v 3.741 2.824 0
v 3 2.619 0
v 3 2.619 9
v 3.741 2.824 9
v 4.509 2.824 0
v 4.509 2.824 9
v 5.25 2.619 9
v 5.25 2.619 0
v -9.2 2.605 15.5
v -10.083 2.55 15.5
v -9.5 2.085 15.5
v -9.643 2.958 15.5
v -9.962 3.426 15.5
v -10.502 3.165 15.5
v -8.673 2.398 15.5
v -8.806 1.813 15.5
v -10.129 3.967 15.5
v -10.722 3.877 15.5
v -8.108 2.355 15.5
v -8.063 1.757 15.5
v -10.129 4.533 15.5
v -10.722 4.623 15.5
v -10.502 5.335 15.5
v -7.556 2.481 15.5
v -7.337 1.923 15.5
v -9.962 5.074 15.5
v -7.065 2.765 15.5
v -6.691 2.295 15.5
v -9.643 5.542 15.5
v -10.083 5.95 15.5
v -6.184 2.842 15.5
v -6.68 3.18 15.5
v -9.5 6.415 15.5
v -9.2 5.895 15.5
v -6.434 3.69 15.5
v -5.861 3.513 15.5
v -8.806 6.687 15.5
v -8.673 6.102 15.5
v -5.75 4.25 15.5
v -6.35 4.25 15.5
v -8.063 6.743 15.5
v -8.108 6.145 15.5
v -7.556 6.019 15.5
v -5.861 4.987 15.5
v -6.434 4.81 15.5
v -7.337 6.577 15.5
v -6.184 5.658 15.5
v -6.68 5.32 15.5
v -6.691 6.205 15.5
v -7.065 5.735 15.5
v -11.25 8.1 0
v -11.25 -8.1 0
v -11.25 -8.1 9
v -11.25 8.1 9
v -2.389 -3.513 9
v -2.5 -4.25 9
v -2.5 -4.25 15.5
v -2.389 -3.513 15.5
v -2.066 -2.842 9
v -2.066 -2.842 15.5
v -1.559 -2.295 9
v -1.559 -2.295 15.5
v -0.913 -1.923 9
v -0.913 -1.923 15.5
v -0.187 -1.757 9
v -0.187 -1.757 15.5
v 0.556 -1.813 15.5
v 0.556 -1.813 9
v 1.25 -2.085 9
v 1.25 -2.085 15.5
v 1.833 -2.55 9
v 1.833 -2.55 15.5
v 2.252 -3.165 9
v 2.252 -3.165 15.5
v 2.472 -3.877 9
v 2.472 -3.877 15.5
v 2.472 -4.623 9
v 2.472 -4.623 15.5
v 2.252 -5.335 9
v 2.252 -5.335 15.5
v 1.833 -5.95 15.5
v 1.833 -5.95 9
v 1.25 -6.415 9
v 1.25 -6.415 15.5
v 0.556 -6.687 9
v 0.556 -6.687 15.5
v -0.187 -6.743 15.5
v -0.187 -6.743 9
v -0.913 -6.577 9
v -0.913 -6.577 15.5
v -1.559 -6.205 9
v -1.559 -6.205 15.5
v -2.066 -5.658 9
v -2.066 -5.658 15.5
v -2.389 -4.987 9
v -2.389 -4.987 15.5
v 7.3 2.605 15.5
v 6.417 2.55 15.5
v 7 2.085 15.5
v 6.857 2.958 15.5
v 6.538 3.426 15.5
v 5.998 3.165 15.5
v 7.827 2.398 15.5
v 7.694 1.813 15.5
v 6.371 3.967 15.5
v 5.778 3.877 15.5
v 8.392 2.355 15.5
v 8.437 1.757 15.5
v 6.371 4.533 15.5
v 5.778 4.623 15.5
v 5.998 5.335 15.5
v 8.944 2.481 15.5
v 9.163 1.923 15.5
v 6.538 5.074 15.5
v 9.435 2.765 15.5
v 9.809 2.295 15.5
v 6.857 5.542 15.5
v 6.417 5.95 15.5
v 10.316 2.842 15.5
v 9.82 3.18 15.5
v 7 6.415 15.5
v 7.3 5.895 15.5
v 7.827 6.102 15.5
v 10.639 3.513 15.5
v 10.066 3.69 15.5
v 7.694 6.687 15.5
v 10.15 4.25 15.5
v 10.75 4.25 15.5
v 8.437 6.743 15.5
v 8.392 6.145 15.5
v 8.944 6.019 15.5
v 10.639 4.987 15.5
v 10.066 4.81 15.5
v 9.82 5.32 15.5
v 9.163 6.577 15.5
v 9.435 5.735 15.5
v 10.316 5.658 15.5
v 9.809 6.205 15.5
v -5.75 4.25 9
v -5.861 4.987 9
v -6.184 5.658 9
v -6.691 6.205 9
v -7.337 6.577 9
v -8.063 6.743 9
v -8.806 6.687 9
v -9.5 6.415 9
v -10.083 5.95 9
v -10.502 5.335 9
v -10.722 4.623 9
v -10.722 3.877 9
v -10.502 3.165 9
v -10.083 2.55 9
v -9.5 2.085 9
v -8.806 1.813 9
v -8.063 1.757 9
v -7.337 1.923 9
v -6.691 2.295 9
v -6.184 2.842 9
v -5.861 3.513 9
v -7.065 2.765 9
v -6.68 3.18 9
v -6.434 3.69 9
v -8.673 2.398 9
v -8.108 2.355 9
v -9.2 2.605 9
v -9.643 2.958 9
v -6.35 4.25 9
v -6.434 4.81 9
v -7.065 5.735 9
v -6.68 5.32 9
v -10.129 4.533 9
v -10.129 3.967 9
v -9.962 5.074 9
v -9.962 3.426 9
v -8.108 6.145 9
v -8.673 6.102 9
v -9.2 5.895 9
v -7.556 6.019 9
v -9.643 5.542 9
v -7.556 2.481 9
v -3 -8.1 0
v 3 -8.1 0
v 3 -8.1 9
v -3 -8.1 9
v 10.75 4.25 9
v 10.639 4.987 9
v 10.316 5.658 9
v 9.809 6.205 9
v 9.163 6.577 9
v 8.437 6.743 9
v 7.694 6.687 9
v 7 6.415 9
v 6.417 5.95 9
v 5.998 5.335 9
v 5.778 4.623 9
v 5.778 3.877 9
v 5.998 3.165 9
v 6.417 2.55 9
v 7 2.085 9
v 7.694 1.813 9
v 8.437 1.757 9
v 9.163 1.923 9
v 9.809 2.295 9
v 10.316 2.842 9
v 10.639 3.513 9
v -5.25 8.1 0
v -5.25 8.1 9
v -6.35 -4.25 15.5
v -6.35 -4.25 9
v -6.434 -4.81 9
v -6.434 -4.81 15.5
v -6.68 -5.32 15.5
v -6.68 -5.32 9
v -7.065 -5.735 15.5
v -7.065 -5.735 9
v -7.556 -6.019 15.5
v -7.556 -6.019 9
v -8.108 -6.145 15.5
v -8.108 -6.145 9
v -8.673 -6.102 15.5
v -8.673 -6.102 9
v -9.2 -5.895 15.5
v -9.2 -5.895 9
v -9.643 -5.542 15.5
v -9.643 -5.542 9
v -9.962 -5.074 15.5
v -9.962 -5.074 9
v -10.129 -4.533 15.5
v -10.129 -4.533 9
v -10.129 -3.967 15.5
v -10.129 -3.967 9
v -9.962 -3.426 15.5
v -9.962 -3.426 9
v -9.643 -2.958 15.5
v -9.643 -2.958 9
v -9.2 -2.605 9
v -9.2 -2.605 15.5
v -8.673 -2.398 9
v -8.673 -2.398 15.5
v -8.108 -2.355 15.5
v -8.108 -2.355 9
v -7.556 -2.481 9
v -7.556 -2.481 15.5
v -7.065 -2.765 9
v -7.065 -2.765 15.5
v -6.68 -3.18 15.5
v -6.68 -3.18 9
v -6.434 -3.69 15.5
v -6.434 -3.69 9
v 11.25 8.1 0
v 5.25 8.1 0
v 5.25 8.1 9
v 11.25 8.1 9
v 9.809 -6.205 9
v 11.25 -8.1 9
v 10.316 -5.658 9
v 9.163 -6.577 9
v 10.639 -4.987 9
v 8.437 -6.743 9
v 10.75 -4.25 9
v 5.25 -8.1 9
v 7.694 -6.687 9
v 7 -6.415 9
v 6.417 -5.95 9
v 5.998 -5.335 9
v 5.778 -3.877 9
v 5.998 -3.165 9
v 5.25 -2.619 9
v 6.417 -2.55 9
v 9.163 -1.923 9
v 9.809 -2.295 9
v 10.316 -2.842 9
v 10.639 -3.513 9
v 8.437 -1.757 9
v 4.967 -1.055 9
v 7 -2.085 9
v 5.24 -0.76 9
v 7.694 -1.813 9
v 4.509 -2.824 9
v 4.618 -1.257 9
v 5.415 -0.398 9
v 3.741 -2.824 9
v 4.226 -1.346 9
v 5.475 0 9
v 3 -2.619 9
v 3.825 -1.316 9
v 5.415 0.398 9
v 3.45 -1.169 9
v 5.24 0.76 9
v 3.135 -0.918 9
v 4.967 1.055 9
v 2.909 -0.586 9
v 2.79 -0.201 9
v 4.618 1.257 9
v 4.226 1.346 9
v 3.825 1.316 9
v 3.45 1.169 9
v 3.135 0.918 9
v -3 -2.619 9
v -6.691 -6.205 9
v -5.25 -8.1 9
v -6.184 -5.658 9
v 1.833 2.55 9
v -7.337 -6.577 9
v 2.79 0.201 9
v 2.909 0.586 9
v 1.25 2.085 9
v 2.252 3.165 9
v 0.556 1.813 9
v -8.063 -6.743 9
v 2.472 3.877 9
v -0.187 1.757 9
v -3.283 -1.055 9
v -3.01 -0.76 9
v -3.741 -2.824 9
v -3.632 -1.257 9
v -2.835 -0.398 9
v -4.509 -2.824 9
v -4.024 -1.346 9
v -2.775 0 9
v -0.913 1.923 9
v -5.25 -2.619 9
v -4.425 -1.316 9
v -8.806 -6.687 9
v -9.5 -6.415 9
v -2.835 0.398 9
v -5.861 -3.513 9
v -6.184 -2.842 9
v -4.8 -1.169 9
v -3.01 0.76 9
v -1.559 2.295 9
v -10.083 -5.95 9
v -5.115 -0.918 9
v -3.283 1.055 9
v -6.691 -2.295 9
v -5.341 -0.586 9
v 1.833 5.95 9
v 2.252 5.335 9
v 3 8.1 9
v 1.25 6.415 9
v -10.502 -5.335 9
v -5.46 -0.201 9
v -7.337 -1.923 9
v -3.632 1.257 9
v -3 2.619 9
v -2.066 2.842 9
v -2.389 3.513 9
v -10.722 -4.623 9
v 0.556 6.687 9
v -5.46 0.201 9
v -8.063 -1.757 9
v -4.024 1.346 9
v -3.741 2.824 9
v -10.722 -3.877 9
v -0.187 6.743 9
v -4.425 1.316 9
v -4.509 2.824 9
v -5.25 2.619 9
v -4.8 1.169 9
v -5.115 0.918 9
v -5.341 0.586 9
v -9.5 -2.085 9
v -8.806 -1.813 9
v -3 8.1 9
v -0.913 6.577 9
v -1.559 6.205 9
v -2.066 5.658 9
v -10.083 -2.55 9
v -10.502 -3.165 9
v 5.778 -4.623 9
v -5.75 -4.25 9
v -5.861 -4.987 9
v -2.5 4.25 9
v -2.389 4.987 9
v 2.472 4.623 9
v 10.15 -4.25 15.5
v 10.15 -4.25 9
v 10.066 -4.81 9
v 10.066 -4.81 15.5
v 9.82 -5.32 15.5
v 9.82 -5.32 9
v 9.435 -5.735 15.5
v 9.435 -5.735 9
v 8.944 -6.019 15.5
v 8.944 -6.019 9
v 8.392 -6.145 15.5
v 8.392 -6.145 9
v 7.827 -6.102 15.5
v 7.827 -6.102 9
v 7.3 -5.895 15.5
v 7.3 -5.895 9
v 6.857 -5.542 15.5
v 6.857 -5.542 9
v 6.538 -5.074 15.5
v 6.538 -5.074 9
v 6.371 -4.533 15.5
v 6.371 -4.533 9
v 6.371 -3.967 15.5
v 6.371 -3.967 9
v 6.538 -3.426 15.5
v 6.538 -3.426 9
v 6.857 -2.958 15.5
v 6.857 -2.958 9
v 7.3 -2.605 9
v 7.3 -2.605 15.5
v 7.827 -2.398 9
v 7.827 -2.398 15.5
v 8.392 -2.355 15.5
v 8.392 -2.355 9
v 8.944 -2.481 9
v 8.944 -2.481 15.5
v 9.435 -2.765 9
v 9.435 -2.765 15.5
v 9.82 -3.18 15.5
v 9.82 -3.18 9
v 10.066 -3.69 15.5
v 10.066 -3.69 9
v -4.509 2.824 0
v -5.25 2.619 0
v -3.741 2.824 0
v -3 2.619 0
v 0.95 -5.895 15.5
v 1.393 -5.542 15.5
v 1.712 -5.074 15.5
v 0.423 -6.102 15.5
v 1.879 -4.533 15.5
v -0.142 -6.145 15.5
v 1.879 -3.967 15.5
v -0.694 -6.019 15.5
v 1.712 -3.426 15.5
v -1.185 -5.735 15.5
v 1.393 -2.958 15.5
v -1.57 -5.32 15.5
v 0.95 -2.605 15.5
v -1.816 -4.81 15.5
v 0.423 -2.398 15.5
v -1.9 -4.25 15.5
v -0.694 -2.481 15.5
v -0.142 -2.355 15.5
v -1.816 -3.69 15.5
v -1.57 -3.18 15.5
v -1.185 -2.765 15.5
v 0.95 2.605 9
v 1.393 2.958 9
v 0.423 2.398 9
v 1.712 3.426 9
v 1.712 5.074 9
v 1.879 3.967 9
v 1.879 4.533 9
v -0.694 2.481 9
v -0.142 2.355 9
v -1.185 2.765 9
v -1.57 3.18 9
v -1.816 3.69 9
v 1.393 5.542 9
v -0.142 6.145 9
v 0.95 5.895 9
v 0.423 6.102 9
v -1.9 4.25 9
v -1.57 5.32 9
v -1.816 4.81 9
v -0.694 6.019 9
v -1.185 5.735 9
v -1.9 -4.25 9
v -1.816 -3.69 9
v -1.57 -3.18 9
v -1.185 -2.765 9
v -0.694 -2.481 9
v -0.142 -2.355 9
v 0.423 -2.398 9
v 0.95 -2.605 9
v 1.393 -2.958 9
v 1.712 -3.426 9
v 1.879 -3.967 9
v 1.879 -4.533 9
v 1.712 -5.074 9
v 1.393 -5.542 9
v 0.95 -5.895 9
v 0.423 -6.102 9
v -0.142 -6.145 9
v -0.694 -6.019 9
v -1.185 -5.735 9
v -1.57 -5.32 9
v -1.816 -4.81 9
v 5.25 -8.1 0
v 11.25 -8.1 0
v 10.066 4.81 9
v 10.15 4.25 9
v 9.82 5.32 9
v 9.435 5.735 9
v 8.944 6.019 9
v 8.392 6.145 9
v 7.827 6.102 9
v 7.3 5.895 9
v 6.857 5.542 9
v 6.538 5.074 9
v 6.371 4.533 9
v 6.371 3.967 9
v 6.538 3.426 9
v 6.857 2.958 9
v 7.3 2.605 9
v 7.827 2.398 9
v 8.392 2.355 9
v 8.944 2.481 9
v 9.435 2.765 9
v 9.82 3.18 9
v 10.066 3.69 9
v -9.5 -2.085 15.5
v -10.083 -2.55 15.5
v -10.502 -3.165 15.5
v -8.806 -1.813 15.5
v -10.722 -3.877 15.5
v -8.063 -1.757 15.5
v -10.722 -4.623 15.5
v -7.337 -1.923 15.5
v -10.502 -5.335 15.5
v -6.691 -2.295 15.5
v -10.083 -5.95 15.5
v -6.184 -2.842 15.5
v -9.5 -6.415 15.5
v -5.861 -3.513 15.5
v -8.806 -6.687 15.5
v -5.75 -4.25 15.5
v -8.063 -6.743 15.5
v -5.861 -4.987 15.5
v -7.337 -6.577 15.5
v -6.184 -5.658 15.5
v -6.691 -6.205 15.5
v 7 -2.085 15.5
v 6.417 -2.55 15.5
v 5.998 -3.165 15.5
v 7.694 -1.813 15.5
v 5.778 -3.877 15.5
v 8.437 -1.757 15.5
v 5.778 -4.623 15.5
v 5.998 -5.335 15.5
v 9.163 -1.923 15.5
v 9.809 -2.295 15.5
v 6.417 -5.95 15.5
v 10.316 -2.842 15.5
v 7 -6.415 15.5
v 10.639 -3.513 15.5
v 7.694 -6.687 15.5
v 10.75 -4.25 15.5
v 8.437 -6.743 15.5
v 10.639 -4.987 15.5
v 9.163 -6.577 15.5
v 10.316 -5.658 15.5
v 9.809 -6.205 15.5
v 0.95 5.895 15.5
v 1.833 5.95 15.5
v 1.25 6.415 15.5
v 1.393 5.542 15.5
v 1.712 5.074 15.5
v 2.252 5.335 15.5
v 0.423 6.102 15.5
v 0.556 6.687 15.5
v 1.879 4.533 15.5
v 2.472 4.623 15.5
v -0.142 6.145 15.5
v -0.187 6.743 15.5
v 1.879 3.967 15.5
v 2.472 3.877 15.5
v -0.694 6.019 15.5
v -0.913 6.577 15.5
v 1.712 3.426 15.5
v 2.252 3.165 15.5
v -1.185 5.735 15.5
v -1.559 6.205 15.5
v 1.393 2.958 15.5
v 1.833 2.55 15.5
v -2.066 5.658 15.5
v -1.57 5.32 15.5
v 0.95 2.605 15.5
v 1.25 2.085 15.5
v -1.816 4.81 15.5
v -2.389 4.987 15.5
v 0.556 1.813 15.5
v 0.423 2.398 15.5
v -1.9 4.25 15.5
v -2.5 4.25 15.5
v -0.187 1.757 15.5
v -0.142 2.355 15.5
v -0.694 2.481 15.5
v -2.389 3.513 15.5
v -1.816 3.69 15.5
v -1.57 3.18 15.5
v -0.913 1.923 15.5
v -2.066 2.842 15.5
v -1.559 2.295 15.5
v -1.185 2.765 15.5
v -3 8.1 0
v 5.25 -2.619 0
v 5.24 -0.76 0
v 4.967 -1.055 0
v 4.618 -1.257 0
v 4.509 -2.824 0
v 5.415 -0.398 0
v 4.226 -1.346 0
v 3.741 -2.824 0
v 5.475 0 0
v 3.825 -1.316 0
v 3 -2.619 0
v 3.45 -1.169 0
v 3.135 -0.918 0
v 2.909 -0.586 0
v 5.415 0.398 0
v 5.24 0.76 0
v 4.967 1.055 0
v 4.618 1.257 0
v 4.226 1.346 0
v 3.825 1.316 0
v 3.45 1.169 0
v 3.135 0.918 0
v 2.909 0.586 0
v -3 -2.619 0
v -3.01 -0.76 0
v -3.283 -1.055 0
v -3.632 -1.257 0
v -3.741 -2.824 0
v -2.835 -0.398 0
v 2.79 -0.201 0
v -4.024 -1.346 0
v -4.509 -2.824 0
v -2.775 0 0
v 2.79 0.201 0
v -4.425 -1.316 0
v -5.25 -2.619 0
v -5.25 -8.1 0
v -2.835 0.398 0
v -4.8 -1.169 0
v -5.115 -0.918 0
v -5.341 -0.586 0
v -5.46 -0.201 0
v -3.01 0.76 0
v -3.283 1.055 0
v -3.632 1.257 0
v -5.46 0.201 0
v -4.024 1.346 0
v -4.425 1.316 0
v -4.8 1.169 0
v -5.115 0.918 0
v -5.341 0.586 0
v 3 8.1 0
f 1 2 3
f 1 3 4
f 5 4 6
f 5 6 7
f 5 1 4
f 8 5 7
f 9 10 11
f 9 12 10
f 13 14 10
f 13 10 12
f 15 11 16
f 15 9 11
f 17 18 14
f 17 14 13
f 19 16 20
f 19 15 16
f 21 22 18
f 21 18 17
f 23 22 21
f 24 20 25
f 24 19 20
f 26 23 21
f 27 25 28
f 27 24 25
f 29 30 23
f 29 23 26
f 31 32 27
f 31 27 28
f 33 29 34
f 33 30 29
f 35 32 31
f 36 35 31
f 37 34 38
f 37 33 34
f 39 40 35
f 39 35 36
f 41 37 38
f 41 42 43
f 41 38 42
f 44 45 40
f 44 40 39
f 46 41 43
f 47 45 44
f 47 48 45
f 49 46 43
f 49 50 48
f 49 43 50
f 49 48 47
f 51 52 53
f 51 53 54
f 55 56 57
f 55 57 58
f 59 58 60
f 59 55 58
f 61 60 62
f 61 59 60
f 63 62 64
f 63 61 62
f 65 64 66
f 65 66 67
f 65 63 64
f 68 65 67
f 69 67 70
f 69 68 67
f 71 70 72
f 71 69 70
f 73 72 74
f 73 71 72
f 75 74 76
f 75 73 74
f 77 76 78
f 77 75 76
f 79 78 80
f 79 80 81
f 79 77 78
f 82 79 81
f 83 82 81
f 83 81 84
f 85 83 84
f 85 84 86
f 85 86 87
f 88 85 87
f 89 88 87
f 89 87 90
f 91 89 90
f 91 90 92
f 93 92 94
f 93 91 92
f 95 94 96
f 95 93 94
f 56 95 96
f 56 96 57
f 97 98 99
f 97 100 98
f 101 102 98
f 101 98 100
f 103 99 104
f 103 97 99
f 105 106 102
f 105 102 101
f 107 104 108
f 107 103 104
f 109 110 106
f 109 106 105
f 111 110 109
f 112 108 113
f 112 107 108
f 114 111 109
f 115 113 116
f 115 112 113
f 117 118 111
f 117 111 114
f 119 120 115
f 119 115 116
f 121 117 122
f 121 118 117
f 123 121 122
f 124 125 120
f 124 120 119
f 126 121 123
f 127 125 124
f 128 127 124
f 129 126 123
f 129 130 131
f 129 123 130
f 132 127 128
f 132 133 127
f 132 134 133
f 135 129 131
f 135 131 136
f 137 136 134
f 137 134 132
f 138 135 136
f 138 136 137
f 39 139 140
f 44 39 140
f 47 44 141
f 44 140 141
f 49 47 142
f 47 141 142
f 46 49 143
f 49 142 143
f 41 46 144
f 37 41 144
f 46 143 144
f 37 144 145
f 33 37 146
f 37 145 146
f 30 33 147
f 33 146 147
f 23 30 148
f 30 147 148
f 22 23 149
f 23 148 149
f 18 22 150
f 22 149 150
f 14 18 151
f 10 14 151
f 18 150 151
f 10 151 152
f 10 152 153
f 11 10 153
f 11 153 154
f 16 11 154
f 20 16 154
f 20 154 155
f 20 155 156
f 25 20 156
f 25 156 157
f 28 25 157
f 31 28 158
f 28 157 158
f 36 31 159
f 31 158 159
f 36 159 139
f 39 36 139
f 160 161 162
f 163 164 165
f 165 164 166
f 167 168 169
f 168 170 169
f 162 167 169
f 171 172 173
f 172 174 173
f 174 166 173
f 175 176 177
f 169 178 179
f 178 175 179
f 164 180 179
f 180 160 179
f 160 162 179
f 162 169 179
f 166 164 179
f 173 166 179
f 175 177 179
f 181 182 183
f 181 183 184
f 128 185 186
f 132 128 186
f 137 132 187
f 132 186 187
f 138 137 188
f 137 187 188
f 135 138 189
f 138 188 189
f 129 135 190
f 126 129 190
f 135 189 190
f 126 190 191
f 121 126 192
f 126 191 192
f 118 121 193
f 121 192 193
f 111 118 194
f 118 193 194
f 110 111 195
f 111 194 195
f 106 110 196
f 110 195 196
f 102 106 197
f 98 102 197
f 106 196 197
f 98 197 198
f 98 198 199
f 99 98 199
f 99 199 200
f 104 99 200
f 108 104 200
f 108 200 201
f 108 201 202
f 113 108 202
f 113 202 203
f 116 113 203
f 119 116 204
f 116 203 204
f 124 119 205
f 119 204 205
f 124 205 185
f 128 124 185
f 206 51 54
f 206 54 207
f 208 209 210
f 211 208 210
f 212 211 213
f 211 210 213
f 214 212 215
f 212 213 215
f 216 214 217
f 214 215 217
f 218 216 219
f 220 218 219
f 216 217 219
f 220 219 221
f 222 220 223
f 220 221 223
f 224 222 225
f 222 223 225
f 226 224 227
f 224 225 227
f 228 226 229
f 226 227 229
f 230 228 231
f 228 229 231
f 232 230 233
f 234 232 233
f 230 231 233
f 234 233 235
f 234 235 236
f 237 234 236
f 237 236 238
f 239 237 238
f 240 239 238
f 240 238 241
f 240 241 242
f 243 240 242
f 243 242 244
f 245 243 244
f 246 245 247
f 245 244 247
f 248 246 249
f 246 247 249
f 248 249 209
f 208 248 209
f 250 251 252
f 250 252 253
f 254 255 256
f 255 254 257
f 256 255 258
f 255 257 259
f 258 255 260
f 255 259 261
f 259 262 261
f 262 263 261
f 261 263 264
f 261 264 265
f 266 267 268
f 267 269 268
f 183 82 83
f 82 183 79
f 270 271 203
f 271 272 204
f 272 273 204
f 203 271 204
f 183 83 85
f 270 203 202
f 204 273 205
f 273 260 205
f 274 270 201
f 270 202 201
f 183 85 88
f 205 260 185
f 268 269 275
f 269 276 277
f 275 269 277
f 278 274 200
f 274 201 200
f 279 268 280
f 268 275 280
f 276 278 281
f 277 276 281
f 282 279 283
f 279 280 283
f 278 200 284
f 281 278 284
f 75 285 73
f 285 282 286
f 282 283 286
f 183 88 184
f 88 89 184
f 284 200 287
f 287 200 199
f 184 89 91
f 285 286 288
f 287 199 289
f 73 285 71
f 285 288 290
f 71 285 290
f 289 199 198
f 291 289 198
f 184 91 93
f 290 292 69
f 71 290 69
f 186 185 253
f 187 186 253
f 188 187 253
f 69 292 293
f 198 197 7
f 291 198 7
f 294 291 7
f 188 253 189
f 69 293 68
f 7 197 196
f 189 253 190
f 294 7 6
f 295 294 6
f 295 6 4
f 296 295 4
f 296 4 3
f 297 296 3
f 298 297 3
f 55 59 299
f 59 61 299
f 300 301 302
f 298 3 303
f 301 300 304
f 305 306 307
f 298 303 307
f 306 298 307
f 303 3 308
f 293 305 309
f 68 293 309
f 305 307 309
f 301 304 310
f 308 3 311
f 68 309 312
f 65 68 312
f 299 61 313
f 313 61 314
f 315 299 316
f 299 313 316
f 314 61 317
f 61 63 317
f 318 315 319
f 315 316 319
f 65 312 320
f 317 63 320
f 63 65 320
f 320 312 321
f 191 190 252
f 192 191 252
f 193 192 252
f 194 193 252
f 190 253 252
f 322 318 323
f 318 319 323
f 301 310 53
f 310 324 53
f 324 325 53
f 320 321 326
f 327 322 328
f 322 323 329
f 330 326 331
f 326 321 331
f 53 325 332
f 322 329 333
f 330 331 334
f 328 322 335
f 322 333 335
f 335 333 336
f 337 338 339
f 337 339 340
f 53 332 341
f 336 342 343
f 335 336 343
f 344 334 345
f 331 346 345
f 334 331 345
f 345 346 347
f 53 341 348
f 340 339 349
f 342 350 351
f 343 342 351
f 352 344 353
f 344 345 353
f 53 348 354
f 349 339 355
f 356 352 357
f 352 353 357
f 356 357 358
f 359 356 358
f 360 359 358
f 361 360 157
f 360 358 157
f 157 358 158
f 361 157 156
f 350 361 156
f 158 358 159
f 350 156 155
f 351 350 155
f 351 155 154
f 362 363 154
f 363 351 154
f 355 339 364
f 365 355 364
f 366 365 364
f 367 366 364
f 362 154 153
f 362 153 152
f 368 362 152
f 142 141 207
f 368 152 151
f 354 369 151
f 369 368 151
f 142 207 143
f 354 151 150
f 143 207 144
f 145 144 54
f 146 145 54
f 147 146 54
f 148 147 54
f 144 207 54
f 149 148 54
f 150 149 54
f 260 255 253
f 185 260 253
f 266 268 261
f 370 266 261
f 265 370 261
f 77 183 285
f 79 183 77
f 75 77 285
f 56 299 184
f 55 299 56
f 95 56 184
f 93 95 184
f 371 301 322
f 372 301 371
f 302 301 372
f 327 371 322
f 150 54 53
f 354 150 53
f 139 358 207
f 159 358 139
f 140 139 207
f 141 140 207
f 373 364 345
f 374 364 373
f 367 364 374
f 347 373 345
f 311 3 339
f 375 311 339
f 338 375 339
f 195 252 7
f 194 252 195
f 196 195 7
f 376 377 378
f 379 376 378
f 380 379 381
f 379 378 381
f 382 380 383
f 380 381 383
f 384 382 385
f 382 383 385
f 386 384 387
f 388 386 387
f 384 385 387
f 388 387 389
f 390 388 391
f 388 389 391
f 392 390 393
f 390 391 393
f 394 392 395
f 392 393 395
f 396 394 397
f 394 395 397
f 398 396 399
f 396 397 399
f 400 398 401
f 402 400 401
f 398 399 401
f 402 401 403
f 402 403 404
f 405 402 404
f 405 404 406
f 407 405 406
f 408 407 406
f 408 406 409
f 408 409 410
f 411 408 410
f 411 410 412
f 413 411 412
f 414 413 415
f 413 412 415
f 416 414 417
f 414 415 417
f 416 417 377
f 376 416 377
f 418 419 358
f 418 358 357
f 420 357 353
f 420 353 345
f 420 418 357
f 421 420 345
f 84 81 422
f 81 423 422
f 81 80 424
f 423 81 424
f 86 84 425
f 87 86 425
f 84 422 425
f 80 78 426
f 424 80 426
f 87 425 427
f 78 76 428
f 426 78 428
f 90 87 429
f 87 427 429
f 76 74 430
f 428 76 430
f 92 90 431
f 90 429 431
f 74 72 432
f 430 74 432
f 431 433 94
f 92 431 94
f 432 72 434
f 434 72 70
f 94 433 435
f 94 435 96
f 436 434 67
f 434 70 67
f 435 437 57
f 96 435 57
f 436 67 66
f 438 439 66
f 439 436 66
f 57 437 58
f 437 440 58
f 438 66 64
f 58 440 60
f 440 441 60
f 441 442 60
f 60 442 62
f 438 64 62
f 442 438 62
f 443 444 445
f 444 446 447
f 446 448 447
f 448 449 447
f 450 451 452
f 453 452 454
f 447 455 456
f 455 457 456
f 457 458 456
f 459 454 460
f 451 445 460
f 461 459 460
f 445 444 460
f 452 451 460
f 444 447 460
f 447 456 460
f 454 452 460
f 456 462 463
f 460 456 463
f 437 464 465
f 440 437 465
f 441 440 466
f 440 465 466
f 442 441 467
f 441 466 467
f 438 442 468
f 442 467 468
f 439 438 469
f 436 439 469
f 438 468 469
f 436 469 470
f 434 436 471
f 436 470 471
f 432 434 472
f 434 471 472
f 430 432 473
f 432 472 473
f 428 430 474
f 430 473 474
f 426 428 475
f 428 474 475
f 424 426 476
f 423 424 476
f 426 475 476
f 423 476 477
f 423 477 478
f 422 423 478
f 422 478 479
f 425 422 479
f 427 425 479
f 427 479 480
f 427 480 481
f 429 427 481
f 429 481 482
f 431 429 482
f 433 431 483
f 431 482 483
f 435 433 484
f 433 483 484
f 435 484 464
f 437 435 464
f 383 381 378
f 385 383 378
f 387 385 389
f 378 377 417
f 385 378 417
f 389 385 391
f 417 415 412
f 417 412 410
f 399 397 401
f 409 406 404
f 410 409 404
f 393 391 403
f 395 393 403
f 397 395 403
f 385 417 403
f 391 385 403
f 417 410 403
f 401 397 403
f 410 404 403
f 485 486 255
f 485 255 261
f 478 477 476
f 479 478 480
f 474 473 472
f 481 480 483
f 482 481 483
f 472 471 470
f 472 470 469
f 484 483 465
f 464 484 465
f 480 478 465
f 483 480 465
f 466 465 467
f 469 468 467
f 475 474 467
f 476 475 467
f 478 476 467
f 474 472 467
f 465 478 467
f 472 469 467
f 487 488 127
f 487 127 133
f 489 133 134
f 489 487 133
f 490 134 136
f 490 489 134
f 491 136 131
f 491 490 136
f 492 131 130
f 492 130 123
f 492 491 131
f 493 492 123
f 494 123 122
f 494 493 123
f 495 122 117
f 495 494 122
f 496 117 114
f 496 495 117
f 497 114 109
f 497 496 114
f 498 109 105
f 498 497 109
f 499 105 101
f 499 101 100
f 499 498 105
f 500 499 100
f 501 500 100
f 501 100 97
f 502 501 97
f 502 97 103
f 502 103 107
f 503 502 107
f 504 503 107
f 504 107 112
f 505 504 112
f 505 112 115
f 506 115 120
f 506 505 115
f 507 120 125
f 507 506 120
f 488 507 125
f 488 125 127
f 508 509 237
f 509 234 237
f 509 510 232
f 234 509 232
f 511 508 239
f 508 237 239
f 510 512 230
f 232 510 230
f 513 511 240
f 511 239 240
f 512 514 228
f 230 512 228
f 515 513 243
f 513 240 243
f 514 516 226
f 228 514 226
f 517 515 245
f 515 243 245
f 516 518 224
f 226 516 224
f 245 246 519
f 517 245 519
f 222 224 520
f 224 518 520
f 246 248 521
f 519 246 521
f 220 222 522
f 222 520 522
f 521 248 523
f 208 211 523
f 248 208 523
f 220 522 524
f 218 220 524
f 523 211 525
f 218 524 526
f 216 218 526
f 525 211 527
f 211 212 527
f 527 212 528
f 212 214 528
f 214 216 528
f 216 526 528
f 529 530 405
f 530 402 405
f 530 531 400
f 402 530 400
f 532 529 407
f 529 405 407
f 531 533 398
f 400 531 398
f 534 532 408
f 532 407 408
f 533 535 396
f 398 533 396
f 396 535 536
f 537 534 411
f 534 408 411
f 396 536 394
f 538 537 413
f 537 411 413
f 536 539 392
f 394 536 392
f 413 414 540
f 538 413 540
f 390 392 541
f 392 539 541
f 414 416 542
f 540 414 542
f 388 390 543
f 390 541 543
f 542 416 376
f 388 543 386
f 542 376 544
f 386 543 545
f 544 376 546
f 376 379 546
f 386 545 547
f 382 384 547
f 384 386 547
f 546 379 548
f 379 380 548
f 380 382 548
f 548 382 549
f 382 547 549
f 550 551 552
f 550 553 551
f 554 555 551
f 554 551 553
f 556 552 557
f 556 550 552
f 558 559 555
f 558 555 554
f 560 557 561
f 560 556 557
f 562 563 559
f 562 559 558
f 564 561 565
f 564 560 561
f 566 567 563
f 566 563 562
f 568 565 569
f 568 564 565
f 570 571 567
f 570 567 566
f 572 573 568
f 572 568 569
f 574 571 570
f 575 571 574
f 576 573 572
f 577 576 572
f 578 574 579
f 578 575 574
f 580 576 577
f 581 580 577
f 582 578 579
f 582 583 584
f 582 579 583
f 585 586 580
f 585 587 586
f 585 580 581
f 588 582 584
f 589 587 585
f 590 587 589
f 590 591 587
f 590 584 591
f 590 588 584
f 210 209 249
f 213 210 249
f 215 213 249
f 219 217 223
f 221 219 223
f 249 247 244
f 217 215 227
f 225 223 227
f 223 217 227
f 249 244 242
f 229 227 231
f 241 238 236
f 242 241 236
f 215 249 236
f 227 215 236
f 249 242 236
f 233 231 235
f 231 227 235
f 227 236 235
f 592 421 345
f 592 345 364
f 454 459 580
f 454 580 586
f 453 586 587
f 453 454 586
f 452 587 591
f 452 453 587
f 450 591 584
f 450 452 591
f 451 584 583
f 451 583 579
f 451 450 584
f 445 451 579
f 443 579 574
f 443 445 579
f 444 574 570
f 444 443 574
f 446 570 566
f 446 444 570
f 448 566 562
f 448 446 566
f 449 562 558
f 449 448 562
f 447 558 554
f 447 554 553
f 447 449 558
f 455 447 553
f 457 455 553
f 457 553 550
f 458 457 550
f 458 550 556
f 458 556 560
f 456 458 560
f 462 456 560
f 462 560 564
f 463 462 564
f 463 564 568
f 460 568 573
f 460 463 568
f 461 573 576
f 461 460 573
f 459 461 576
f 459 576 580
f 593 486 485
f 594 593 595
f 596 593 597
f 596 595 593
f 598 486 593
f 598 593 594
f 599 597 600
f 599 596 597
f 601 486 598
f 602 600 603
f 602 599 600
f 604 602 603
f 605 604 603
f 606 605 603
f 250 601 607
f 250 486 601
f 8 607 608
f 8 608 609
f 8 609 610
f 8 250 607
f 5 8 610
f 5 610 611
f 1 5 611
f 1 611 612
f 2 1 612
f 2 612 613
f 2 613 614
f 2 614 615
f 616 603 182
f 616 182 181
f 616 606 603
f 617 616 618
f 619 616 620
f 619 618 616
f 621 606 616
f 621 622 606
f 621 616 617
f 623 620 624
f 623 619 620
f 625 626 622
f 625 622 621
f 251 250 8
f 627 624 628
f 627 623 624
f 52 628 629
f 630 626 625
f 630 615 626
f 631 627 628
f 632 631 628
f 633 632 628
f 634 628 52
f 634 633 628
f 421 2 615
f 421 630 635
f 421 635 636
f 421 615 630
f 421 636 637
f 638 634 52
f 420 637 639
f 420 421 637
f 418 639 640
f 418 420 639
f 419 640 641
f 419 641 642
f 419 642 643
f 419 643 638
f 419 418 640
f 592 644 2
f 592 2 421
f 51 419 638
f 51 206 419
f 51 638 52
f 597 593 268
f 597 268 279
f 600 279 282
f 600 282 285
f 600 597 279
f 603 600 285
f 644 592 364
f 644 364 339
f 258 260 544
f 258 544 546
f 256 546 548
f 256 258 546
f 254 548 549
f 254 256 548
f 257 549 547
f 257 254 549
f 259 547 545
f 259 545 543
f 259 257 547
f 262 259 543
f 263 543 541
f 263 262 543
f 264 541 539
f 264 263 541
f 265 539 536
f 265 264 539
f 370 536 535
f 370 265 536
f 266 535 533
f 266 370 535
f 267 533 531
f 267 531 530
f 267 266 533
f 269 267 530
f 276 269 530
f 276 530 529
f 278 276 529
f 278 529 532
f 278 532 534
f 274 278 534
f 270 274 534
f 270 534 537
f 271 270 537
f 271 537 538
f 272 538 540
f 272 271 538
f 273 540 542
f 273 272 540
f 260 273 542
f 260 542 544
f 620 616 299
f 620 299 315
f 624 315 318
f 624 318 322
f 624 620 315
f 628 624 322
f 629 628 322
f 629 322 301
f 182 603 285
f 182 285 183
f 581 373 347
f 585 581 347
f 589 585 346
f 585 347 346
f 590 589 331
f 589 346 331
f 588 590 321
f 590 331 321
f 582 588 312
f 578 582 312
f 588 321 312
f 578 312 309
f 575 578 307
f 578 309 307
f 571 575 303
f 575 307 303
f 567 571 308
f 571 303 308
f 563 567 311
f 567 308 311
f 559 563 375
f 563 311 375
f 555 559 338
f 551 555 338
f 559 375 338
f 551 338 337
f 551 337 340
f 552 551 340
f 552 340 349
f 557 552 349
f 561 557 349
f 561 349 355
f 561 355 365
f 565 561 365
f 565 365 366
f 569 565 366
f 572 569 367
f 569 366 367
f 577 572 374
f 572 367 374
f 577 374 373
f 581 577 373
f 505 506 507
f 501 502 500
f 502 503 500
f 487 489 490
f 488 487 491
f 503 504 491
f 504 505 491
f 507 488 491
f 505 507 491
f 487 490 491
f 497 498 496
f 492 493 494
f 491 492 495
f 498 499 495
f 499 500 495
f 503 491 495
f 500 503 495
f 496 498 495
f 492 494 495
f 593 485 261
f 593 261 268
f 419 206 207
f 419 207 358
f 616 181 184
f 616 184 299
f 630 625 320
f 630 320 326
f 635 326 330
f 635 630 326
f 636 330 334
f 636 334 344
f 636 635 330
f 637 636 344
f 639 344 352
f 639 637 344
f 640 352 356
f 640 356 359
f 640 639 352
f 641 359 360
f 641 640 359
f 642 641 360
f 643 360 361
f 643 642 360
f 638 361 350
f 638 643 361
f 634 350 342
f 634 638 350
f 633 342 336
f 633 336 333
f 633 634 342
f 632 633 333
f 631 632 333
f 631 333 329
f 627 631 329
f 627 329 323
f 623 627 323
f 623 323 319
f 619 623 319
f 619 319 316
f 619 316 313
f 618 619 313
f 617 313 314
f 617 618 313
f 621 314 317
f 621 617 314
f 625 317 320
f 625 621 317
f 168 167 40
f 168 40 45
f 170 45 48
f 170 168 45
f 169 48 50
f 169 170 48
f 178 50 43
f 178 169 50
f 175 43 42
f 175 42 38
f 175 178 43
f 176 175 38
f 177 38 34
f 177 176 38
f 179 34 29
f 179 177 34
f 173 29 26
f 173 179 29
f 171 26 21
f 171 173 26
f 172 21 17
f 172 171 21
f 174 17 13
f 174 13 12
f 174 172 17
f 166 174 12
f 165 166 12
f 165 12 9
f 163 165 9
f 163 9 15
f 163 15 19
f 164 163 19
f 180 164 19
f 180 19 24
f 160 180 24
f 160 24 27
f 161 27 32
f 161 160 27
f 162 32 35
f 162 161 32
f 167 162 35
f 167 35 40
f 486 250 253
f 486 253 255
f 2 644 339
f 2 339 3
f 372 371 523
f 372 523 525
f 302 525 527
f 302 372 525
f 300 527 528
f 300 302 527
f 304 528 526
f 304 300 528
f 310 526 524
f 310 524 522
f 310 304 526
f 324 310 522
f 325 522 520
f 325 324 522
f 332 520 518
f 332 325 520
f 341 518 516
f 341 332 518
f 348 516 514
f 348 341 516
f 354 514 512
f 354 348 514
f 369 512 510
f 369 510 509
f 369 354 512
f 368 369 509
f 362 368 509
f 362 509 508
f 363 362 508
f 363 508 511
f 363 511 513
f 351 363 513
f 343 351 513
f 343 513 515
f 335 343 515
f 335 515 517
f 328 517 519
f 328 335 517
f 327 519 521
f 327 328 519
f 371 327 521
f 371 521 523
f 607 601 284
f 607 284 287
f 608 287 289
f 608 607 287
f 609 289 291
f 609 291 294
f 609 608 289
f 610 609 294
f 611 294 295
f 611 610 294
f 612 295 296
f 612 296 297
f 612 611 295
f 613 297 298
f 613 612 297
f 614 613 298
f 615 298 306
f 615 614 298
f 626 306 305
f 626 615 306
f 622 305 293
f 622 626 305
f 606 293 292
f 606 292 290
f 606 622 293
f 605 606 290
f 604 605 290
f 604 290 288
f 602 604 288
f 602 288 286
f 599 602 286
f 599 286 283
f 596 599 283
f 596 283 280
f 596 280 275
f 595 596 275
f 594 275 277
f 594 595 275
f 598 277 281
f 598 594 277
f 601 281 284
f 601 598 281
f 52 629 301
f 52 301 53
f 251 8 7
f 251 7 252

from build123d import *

# Parameters (mm, degrees)
SKETCH1_R               = 1.35
BOSS_EXTRUDE1_DEPTH     = 9
SKETCH2_R               = 2.5
SKETCH2_R_2             = 1.9
BOSS_EXTRUDE2_DEPTH     = 6.5
CRVPATTERN1_START       = 9
CRVPATTERN1_OUTLINE_R   = 2.5
CRVPATTERN1_OUTLINE_R_2 = 1.9
CRVPATTERN1_DEPTH       = 6.5


# Read off the part's stored shape, not the designer's step: CrvPattern1
with BuildPart() as part:
    # Sketch1 → Boss-Extrude1 (new body)
    with BuildSketch(Plane.XY):
        with BuildLine():
            Line((11.25, 8.1), (11.25, -8.1))
            Line((11.25, -8.1), (5.25, -8.1))
            Line((5.25, -8.1), (5.25, -2.618563538))
            ThreePointArc((5.25, -2.618563538), (4.125, -2.85), (3, -2.618563538))
            Line((3, -2.618563538), (3, -8.1))
            Line((3, -8.1), (-3, -8.1))
            Line((-3, -8.1), (-3, -2.618563538))
            ThreePointArc((-3, -2.618563538), (-4.125, -2.85), (-5.25, -2.618563538))
            Line((-5.25, -2.618563538), (-5.25, -8.1))
            Line((-5.25, -8.1), (-11.25, -8.1))
            Line((-11.25, -8.1), (-11.25, 8.1))
            Line((-11.25, 8.1), (-5.25, 8.1))
            Line((-5.25, 8.1), (-5.25, 2.618563538))
            ThreePointArc((-5.25, 2.618563538), (-4.125, 2.85), (-3, 2.618563538))
            Line((-3, 2.618563538), (-3, 8.1))
            Line((-3, 8.1), (3, 8.1))
            Line((3, 8.1), (3, 2.618563538))
            ThreePointArc((3, 2.618563538), (4.125, 2.85), (5.25, 2.618563538))
            Line((5.25, 2.618563538), (5.25, 8.1))
            Line((5.25, 8.1), (11.25, 8.1))
        make_face()
        with Locations((-4.125, 0)):
            Circle(SKETCH1_R, mode=Mode.SUBTRACT)
        with Locations((4.125, 0)):
            Circle(SKETCH1_R, mode=Mode.SUBTRACT)
    extrude(amount=BOSS_EXTRUDE1_DEPTH)

    # Sketch2 → Boss-Extrude2 (add)
    with BuildSketch(Plane.XY.offset(9)):
        with Locations(Location((0, 4.25, 0), (0, 0, 180))):
            Circle(SKETCH2_R)
        with Locations(Location((0, 4.25, 0), (0, 0, 180))):
            Circle(SKETCH2_R_2, mode=Mode.SUBTRACT)
    boss_extrude2 = extrude(amount=BOSS_EXTRUDE2_DEPTH)

    # CrvPattern1 outline → CrvPattern1 (add)
    # profile 1 of 2: a face of its own
    with BuildSketch(Plane.XY.offset(CRVPATTERN1_START)):
        with Locations((8.25, 4.25)):
            Circle(CRVPATTERN1_OUTLINE_R)
        with Locations((8.25, 4.25)):
            Circle(CRVPATTERN1_OUTLINE_R_2, mode=Mode.SUBTRACT)
    # profile 2 of 2: a face of its own
    with BuildSketch(Plane.XY.offset(CRVPATTERN1_START)):
        with Locations((-8.25, 4.25)):
            Circle(CRVPATTERN1_OUTLINE_R)
        with Locations((-8.25, 4.25)):
            Circle(CRVPATTERN1_OUTLINE_R_2, mode=Mode.SUBTRACT)
    crvpattern1 = extrude(amount=CRVPATTERN1_DEPTH)

    # Mirror1: Boss-Extrude2, CrvPattern1 across plane
    add(boss_extrude2.mirror(Plane.ZX))
    add(crvpattern1.mirror(Plane.ZX))


solid = part.part
